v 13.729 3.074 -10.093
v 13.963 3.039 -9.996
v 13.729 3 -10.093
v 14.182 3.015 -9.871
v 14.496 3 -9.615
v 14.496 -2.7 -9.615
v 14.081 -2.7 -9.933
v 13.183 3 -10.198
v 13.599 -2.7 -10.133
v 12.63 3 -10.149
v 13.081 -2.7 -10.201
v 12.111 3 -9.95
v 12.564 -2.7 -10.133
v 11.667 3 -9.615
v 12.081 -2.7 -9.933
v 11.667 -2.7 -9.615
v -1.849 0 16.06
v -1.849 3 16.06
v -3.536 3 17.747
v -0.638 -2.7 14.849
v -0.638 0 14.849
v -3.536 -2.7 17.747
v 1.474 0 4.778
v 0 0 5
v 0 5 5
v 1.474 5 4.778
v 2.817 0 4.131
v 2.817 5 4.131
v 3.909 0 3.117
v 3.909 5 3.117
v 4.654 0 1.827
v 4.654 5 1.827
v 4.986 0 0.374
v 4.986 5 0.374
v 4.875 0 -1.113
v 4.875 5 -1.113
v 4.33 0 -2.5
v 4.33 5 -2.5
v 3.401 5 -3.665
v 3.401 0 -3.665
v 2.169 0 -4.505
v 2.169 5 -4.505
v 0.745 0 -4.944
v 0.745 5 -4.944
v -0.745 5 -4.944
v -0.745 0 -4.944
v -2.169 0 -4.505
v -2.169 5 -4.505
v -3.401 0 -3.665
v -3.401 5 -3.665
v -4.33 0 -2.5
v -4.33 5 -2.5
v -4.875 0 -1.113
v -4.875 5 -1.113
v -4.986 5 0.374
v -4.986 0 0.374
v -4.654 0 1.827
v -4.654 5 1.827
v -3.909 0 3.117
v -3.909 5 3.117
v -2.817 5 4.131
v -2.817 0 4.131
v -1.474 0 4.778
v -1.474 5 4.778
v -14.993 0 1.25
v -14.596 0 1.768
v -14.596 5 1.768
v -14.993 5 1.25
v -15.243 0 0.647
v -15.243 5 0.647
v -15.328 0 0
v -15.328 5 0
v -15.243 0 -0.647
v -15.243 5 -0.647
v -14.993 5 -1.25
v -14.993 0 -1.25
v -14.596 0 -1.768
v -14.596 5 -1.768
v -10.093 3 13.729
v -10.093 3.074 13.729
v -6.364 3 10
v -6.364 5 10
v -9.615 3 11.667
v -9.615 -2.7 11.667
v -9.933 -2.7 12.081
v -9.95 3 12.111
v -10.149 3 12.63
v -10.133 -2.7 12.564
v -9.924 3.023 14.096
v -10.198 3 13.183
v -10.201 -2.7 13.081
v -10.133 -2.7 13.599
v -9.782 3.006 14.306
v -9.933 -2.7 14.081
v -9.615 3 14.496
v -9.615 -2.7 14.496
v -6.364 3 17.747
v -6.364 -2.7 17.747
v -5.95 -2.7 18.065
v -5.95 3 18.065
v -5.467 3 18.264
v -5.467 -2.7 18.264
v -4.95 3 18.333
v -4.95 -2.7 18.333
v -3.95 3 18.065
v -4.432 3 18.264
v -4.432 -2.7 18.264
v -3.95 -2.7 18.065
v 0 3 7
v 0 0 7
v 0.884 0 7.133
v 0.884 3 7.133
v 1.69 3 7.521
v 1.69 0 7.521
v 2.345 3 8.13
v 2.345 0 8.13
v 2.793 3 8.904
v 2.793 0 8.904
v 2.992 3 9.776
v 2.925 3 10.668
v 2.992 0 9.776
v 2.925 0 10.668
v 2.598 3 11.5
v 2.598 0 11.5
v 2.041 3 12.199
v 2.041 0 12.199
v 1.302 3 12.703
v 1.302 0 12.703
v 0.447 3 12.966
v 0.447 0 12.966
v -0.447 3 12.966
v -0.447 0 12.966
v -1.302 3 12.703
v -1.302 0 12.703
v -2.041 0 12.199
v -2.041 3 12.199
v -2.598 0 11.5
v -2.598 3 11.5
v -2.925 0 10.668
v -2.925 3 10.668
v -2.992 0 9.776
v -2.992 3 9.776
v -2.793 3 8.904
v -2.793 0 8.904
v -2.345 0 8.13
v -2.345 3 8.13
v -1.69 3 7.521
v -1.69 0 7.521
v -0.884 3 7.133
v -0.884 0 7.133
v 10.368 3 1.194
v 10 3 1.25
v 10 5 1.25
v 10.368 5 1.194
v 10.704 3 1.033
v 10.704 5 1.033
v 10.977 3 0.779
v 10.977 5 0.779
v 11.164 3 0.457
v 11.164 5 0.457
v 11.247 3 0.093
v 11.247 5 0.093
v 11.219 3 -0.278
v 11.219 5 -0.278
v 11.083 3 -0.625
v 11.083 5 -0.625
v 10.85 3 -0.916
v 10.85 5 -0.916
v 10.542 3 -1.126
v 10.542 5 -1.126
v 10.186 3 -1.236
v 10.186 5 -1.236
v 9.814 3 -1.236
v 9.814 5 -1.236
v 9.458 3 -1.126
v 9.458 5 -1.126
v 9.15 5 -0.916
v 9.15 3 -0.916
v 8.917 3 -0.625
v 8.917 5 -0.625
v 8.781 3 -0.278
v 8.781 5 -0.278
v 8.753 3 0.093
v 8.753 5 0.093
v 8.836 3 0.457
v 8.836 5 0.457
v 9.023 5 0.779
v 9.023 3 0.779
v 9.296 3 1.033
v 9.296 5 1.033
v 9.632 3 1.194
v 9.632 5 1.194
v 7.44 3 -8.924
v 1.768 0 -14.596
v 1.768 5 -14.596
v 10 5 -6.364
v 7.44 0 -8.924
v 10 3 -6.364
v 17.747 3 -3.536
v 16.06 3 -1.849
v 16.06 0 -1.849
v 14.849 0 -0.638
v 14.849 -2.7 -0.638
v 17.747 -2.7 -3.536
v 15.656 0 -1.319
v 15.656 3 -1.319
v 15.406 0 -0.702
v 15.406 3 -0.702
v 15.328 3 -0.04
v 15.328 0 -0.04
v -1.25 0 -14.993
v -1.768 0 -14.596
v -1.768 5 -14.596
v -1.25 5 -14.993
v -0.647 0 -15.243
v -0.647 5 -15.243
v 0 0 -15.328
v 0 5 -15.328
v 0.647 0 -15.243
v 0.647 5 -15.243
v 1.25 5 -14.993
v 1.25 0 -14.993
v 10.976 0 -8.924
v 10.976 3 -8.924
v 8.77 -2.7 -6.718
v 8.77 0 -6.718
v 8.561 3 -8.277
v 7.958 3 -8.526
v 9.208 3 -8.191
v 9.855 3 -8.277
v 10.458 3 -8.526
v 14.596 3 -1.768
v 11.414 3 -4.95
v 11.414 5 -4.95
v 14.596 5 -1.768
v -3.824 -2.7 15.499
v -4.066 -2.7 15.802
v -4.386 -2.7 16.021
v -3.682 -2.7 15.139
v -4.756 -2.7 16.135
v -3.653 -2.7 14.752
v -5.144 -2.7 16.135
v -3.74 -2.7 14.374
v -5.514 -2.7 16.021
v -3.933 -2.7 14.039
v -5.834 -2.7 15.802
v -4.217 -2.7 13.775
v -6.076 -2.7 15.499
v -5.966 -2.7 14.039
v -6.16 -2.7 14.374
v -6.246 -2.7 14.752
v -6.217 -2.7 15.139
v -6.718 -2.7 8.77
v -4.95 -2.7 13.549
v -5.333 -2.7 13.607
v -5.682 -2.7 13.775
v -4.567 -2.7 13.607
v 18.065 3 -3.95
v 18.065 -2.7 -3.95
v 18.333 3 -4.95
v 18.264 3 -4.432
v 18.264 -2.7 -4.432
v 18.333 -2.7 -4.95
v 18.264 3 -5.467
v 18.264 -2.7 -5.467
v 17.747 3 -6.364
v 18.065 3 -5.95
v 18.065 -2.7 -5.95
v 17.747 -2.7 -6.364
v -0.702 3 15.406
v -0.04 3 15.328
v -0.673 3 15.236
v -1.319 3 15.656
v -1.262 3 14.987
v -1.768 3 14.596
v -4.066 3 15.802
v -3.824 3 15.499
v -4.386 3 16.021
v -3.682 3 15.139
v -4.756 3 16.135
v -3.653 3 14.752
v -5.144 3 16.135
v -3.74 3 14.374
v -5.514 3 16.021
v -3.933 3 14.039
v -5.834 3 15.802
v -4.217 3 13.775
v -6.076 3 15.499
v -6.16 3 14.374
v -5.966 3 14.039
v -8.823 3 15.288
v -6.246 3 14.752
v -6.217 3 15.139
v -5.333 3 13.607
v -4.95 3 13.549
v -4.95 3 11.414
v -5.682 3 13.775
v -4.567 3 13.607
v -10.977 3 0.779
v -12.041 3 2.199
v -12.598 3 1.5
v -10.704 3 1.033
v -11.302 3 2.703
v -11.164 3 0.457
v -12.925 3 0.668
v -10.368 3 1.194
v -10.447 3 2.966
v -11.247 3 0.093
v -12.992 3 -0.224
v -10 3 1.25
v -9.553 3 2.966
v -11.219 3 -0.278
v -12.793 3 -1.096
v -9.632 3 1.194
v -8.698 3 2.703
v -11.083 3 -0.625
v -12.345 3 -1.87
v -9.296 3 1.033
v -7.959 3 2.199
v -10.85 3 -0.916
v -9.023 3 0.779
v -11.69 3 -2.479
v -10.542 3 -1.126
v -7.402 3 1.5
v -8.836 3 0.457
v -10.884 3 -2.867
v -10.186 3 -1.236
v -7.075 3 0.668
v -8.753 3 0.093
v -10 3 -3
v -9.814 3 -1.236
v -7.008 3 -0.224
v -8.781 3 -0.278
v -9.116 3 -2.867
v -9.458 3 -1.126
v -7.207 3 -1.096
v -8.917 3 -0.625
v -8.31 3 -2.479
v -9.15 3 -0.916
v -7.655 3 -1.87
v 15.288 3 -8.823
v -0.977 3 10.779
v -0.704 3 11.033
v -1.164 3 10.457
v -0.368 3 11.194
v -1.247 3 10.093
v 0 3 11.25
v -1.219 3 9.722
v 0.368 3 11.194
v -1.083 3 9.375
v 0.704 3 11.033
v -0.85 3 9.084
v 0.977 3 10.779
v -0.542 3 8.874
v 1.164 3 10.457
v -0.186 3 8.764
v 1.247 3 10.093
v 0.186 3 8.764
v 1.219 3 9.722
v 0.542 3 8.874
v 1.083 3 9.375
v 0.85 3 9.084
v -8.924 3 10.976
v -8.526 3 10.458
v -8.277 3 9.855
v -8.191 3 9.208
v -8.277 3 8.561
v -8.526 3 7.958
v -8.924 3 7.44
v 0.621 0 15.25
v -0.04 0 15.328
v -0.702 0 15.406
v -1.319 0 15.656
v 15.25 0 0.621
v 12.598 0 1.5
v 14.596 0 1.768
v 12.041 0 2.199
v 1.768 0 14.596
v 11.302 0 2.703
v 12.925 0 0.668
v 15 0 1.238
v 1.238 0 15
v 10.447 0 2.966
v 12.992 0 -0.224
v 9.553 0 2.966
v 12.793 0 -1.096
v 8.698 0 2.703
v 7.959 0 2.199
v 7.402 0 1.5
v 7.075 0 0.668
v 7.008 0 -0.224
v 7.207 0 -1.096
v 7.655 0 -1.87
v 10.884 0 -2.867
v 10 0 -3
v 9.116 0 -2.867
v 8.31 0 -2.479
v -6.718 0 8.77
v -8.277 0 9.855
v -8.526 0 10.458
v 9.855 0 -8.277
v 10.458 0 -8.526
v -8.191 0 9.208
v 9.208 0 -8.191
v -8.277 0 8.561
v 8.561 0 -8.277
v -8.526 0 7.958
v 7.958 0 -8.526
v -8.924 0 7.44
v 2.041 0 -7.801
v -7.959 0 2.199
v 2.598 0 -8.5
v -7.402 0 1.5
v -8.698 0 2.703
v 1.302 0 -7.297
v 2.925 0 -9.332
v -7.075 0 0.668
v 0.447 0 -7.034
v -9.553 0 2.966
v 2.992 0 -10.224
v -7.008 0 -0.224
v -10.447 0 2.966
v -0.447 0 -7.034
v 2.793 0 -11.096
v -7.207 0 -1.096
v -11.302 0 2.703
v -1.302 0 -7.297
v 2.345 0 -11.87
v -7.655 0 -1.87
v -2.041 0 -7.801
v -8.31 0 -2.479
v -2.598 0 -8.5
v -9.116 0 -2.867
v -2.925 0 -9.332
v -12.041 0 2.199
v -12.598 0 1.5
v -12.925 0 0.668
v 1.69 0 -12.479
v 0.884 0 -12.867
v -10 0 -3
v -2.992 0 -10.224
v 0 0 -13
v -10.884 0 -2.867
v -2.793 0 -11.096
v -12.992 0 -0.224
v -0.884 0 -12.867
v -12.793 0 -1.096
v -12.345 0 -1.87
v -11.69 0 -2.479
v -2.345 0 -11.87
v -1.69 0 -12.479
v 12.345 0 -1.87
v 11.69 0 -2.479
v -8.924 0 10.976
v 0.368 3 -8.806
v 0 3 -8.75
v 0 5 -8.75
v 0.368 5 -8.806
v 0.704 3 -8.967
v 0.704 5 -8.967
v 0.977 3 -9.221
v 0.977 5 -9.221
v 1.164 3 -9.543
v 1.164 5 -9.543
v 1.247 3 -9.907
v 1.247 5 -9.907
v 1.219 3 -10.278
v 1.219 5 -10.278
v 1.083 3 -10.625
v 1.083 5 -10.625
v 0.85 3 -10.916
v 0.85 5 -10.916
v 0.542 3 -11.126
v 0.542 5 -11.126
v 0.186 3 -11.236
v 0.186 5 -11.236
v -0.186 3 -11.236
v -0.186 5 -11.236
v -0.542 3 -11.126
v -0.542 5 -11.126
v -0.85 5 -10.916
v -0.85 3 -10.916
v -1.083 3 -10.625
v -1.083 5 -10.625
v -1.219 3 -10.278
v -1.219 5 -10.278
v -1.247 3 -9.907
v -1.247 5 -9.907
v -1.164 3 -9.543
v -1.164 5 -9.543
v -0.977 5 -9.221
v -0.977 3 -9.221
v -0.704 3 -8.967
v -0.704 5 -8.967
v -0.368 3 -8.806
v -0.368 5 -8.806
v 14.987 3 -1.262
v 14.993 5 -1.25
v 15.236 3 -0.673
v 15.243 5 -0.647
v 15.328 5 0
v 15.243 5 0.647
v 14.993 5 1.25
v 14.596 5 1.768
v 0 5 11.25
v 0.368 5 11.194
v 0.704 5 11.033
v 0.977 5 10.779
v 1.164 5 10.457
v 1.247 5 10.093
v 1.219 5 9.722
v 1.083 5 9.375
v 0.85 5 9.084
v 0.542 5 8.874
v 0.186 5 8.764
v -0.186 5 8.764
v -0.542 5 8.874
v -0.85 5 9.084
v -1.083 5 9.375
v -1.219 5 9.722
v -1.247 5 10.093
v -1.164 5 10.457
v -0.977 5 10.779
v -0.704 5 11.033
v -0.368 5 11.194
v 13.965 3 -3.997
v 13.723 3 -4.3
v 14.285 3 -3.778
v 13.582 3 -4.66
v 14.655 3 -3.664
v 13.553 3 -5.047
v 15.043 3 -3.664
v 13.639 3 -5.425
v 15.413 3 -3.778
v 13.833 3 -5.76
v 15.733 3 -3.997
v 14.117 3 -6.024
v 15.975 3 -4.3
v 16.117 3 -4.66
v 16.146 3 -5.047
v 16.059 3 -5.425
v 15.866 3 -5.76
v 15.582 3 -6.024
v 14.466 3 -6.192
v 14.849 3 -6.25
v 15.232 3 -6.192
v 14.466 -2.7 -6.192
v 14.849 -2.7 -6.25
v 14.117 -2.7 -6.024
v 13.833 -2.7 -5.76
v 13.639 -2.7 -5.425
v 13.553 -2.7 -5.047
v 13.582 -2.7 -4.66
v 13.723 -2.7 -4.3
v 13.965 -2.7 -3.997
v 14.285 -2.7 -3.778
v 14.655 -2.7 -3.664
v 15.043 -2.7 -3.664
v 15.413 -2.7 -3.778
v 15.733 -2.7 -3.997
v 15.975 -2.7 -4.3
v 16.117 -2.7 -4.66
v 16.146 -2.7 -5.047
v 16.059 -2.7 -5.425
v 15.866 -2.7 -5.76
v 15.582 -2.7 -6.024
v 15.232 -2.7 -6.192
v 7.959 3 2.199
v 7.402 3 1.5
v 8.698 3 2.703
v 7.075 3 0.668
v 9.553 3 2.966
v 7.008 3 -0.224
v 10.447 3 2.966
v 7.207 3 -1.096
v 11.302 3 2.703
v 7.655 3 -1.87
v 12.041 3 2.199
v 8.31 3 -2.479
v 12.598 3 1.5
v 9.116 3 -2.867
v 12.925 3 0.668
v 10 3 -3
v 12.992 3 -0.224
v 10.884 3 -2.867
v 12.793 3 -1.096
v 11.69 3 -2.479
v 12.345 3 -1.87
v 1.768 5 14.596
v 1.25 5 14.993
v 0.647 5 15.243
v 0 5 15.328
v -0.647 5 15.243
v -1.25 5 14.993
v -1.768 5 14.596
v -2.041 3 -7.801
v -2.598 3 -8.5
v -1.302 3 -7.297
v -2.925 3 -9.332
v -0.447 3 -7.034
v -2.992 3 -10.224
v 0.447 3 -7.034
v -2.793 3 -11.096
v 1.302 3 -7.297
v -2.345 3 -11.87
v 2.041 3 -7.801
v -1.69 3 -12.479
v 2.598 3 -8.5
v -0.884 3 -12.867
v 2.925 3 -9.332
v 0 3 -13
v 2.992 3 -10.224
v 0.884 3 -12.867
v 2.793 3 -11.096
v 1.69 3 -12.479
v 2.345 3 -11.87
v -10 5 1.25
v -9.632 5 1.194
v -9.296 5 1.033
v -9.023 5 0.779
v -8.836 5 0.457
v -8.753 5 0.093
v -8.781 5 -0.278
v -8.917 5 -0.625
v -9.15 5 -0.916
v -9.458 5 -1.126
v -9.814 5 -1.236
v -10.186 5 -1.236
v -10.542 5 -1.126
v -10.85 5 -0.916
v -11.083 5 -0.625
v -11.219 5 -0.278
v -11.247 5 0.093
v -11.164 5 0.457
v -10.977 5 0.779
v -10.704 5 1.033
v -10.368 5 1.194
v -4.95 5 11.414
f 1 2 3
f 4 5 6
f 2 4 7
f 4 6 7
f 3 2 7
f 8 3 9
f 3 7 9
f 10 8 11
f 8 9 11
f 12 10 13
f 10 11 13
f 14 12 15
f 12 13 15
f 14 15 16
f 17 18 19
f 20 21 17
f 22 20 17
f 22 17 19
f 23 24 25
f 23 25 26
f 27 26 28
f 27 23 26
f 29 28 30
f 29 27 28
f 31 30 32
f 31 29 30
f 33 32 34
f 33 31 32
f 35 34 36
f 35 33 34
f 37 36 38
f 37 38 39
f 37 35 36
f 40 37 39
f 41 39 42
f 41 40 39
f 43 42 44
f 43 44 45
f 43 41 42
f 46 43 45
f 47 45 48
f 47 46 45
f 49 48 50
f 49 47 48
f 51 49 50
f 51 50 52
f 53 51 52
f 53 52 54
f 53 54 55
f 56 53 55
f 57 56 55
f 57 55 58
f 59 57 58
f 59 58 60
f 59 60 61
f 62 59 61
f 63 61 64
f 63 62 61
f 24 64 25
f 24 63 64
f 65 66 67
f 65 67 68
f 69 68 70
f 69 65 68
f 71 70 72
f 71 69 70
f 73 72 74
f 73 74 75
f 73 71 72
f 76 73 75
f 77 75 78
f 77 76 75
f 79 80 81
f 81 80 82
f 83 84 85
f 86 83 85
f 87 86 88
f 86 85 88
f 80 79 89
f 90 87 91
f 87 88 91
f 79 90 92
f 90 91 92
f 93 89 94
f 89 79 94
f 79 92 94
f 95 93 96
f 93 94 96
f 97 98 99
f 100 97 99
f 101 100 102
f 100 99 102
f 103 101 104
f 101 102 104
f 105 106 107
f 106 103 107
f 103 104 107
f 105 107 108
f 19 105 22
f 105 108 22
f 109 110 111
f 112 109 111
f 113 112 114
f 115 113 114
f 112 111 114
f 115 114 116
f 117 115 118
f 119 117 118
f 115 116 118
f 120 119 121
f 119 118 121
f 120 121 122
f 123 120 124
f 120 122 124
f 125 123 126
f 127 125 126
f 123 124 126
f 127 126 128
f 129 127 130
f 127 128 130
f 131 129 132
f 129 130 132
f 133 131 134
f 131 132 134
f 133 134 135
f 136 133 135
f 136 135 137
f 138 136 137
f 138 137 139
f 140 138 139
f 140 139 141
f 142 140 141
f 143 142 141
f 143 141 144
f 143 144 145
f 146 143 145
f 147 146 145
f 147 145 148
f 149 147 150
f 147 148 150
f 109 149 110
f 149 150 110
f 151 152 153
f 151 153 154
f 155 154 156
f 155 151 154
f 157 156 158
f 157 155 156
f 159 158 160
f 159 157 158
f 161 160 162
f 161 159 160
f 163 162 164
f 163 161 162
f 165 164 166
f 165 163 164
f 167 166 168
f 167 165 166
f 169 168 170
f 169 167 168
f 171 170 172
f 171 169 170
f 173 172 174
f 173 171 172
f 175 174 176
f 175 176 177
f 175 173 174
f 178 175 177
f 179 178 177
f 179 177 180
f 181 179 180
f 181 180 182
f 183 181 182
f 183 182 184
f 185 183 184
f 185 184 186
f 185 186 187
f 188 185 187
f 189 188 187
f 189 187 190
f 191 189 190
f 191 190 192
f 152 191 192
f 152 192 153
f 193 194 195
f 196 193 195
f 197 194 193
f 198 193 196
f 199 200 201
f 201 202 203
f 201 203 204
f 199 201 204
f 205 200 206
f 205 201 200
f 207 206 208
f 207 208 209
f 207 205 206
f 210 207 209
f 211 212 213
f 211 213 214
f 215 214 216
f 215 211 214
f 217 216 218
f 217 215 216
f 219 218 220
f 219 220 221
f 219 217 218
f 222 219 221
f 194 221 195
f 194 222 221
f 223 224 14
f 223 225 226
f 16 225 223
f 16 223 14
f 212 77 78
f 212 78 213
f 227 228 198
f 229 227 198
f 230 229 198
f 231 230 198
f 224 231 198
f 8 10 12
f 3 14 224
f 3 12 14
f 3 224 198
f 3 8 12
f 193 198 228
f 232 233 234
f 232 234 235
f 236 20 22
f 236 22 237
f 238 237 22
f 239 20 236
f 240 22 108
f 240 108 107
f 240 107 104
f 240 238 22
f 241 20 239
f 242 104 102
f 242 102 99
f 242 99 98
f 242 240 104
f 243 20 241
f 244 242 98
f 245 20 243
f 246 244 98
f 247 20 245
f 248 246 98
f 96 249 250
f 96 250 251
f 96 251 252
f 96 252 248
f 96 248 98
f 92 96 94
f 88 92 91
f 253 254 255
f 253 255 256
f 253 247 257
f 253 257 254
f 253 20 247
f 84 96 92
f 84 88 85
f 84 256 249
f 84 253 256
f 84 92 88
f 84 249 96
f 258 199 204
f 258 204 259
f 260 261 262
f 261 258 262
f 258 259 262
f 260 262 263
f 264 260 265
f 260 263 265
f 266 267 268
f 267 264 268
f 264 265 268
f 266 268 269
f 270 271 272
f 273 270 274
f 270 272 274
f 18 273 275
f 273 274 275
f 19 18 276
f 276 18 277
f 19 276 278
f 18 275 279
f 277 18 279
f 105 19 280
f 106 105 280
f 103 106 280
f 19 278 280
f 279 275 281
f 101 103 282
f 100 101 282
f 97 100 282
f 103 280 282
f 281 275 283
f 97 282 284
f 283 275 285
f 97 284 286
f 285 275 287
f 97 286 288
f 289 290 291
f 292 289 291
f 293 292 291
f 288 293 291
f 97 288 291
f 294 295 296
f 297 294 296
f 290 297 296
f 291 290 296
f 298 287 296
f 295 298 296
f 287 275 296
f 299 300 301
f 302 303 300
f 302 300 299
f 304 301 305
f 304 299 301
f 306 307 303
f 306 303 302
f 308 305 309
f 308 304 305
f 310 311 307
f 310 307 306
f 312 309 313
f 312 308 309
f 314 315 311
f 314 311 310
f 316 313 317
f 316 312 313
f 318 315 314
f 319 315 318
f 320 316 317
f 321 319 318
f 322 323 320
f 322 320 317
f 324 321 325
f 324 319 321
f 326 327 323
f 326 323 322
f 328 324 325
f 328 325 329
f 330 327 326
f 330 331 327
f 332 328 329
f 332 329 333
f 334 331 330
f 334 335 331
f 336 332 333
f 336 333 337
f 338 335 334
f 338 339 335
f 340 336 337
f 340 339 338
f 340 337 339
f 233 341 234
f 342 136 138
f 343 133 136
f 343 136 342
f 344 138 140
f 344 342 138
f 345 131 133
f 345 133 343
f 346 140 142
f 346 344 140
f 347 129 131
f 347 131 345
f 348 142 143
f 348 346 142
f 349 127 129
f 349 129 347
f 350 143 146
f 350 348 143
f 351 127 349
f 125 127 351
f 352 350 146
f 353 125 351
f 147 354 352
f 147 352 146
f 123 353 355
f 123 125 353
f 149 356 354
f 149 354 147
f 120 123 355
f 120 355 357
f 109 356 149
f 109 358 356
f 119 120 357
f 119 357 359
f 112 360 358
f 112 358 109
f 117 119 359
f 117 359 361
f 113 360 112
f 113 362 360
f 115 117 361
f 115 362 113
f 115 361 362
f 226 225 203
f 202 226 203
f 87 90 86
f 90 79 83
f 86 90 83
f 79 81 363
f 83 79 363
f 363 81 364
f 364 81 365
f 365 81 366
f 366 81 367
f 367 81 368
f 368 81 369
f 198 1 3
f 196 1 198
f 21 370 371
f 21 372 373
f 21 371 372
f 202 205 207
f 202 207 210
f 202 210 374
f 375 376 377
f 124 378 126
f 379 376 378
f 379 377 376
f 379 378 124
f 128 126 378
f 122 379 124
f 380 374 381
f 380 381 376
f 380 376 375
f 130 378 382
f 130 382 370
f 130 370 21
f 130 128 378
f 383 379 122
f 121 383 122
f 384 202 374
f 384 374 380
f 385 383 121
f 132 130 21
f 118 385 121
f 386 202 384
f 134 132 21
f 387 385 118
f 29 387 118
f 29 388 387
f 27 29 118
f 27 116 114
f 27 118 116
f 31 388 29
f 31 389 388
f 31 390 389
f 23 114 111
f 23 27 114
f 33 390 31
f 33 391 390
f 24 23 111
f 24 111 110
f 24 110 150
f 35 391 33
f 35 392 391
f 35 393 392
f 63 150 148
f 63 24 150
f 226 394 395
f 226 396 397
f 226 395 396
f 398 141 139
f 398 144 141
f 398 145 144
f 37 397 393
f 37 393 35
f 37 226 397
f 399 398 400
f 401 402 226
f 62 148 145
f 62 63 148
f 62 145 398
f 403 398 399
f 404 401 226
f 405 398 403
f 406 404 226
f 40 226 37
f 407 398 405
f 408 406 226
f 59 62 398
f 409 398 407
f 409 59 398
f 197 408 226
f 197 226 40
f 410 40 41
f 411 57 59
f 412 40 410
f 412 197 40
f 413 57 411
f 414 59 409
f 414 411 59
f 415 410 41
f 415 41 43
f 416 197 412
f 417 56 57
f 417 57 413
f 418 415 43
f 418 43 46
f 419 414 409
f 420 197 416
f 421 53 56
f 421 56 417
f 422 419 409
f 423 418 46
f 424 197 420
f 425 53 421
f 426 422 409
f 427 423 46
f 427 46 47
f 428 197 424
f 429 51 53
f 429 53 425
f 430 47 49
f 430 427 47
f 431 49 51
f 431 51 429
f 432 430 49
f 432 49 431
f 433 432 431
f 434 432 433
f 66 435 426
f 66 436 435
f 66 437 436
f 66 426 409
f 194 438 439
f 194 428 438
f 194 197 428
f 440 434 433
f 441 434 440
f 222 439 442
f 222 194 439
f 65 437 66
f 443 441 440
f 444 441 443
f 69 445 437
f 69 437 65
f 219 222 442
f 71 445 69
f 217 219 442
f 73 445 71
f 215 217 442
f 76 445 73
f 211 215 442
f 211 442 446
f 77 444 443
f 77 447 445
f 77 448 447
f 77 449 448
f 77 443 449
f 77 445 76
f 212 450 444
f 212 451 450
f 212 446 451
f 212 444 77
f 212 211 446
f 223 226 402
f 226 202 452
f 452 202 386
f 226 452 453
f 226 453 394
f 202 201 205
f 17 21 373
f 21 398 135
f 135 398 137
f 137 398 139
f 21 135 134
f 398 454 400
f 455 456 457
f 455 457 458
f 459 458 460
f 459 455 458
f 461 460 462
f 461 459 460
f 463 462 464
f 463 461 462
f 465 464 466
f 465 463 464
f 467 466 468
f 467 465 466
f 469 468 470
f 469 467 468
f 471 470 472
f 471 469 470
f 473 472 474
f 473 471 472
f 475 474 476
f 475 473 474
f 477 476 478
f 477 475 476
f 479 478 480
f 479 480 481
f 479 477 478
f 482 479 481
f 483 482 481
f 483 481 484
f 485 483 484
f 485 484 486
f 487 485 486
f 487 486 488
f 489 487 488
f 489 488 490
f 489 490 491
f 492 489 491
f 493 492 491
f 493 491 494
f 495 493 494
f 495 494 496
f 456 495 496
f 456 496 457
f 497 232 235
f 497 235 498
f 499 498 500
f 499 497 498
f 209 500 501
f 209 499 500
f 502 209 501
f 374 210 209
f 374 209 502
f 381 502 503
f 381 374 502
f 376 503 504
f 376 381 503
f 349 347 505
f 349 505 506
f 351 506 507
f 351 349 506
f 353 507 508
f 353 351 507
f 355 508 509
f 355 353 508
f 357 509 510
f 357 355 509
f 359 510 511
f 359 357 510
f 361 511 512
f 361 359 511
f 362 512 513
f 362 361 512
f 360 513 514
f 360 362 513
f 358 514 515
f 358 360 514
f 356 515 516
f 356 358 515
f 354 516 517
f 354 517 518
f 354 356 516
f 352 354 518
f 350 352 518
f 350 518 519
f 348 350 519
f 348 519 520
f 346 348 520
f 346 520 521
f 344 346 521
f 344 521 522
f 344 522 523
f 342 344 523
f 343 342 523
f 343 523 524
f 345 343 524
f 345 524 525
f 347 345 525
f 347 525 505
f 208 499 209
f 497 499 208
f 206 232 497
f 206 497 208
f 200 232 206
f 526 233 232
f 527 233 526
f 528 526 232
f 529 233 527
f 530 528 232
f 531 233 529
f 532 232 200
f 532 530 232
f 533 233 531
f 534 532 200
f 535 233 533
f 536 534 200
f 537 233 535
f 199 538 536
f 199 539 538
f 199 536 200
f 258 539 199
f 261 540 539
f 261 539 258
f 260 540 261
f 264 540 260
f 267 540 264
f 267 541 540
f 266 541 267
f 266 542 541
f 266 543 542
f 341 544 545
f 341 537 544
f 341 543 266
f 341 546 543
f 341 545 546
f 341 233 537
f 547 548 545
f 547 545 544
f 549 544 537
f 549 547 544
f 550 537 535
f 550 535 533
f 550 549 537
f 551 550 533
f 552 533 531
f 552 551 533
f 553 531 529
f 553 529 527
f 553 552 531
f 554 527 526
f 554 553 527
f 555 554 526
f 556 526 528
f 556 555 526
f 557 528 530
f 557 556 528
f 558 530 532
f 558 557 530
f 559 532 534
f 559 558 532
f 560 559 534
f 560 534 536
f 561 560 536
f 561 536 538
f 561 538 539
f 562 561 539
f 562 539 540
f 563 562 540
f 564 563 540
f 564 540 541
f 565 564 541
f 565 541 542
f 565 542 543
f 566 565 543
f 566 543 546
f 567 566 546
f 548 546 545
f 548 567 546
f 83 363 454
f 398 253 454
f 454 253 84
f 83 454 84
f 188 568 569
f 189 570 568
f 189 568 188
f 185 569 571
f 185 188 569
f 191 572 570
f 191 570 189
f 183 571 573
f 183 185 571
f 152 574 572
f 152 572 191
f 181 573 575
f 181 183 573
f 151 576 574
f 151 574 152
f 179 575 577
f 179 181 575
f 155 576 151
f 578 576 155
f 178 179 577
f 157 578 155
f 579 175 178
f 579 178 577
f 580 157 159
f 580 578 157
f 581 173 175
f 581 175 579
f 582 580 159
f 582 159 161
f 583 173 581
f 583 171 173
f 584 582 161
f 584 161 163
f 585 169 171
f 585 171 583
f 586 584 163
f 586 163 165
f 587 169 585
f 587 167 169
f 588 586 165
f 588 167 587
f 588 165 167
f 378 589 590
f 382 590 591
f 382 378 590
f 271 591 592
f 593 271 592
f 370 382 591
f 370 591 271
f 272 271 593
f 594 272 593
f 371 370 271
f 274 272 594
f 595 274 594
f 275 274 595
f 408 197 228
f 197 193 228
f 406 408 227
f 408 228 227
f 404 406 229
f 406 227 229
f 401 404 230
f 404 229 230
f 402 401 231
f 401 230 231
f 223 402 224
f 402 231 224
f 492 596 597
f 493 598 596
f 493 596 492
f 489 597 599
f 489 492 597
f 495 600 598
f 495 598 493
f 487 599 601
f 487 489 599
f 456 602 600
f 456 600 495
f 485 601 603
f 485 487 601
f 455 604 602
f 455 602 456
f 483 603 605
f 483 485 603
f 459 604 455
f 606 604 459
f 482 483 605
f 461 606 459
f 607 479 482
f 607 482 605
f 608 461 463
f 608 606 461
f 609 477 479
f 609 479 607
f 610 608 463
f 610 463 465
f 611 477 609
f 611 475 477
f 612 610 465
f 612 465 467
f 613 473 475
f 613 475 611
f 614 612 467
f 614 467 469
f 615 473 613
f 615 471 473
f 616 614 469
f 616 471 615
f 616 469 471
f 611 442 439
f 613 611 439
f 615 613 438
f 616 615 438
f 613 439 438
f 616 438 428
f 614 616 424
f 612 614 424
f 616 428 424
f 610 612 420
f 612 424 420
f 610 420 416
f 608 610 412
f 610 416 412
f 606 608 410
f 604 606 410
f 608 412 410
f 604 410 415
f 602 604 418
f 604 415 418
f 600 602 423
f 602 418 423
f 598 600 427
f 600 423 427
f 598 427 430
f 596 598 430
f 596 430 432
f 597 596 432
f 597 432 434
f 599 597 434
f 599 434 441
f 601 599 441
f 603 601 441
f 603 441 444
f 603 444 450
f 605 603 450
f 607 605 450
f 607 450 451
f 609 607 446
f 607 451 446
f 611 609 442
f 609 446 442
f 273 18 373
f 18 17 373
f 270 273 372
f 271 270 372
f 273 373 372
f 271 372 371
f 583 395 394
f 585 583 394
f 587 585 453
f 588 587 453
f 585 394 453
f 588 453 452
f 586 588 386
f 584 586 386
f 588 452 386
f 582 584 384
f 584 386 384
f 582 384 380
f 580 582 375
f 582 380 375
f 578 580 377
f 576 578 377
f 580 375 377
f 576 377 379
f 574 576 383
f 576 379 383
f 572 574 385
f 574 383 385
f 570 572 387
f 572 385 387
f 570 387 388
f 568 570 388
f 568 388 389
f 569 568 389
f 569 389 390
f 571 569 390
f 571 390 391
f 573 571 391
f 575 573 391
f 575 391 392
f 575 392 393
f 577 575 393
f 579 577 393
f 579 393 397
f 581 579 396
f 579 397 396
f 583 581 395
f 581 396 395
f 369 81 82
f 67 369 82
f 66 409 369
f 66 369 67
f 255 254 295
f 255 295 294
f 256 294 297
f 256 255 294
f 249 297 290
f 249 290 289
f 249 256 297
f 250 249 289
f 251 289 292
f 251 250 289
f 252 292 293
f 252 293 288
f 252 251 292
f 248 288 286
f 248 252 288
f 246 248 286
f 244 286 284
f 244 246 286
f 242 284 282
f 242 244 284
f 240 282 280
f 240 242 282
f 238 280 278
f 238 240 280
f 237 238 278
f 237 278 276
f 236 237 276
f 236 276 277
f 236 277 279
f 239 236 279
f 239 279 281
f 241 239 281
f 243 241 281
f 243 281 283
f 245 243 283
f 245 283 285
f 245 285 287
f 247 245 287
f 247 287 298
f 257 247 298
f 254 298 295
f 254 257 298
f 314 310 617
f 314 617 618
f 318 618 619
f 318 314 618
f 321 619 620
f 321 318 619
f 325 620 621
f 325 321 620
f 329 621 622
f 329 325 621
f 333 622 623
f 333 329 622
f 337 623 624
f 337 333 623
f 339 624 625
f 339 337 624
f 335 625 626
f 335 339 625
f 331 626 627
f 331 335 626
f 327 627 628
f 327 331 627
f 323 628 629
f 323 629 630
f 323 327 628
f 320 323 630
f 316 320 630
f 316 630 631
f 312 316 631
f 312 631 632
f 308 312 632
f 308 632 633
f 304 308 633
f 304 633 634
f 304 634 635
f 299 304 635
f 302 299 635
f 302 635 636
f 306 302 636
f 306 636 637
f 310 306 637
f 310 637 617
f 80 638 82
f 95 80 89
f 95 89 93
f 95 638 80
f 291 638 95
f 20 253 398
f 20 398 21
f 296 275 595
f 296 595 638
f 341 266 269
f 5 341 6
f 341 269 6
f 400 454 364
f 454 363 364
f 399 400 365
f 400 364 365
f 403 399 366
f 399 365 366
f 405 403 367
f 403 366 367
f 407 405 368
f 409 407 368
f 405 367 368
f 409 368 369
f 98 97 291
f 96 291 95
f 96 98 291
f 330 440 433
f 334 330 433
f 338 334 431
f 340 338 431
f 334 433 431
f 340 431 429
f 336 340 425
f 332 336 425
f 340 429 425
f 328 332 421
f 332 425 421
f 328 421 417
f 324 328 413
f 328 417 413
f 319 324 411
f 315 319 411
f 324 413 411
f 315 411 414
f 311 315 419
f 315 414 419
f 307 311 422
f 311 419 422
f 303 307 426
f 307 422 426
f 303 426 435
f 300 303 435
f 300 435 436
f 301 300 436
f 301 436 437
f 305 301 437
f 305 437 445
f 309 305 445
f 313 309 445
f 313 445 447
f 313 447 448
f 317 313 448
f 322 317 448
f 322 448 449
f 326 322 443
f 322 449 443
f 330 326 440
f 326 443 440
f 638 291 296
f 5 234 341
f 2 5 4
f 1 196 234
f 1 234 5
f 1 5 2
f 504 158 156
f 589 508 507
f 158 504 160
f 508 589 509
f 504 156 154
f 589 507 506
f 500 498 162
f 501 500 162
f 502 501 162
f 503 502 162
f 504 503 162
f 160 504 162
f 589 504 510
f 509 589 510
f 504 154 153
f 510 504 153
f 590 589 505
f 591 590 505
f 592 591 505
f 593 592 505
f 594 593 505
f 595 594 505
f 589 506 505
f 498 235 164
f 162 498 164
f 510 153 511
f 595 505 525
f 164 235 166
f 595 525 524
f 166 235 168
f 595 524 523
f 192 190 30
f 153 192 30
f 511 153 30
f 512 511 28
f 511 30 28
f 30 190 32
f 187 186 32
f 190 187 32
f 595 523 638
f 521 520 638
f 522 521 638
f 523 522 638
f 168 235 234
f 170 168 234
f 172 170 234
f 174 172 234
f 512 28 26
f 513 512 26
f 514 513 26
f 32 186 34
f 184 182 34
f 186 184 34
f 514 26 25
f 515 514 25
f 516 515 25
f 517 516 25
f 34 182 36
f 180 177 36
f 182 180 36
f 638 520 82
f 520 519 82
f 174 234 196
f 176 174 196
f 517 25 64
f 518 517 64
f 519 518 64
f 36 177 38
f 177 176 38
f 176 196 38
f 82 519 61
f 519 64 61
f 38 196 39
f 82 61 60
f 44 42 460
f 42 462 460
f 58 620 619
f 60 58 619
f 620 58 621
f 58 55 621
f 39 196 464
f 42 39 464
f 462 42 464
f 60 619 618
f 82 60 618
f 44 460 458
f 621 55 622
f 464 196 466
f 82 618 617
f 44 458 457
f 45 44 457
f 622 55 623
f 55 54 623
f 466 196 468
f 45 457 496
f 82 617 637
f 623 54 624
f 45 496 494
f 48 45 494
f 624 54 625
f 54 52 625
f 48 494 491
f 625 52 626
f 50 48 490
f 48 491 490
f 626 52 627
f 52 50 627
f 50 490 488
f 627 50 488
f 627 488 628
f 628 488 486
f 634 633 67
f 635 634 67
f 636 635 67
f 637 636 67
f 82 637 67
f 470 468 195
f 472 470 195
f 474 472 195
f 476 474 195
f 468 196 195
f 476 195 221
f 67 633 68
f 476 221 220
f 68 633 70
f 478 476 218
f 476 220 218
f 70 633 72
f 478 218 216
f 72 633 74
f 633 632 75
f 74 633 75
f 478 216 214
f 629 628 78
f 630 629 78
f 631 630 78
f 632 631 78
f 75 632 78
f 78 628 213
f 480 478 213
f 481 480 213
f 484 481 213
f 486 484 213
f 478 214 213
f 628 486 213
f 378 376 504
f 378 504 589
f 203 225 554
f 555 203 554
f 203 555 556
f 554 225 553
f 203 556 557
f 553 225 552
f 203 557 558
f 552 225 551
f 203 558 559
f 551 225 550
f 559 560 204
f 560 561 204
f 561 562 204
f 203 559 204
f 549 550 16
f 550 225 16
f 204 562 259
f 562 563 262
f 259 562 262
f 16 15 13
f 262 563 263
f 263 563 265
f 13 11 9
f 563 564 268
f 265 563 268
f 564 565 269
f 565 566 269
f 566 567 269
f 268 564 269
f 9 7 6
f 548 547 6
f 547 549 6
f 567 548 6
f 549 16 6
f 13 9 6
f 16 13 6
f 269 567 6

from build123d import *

# Parameters (mm, degrees)
SKETCH1_R           = 1.25
SKETCH1_R_2         = 5
BOSS_EXTRUDE1_DEPTH = 5
SKETCH4_R           = 3
CUT_EXTRUDE2_DEPTH  = 3
SKETCH3_R           = 1.3
BOSS_EXTRUDE4_DEPTH = 5.7
BOSS_EXTRUDE6_DEPTH = 1
FILLET1_R           = 2.5
FILLET2_R           = 2


with BuildPart() as part:
    # Sketch1 → Boss-Extrude1 (new body)
    with BuildSketch(Plane(origin=(0, 0, 0), x_dir=(1, 0, 0), z_dir=(0, 1, 0))):
        with BuildLine():
            Line((1.767766953, 14.596194078), (14.596194078, 1.767766953))
            ThreePointArc((14.596194078, 1.767766953), (15.328427125, 0), (14.596194078, -1.767766953))
            Line((14.596194078, -1.767766953), (1.767766953, -14.596194078))
            ThreePointArc((1.767766953, -14.596194078), (0, -15.328427125), (-1.767766953, -14.596194078))
            Line((-1.767766953, -14.596194078), (-14.596194078, -1.767766953))
            ThreePointArc((-14.596194078, -1.767766953), (-15.328427125, 0), (-14.596194078, 1.767766953))
            Line((-14.596194078, 1.767766953), (-1.767766953, 14.596194078))
            ThreePointArc((-1.767766953, 14.596194078), (0, 15.328427125), (1.767766953, 14.596194078))
        make_face()
        with Locations(Location((0, 10, 0), (0, 0, 270))):
            Circle(SKETCH1_R, mode=Mode.SUBTRACT)
        with Locations(Location((0, -10, 0), (0, 0, 270))):
            Circle(SKETCH1_R, mode=Mode.SUBTRACT)
        with Locations(Location((10, 0, 0), (0, 0, 270))):
            Circle(SKETCH1_R, mode=Mode.SUBTRACT)
        with Locations(Location((-10, 0, 0), (0, 0, 270))):
            Circle(SKETCH1_R, mode=Mode.SUBTRACT)
        with Locations(Location((0, 0, 0), (0, 0, 270))):
            Circle(SKETCH1_R_2, mode=Mode.SUBTRACT)
    extrude(amount=BOSS_EXTRUDE1_DEPTH)

    # Sketch4 → Cut-Extrude2 (cut)
    with BuildSketch(Plane.XZ):
        with Locations(Location((0, 10, 0), (0, 0, 270))):
            Circle(SKETCH4_R)
        with Locations(Location((10, 0, 0), (0, 0, 270))):
            Circle(SKETCH4_R)
        with Locations(Location((-10, 0, 0), (0, 0, 270))):
            Circle(SKETCH4_R)
        with Locations(Location((0, -10, 0), (0, 0, 270))):
            Circle(SKETCH4_R)
    extrude(amount=-CUT_EXTRUDE2_DEPTH, mode=Mode.SUBTRACT)

    # Sketch3 → Boss-Extrude4 (add)
    # profile 1 of 4: a face of its own
    with BuildSketch(Plane(origin=(0, -2.7, 0), x_dir=(1, 0, 0), z_dir=(0, 1, 0))):
        Polygon((-4.949747468, -10.537489101), (-0.637994164, -14.849242405), (-4.949747468, -19.160995709), (-9.261500772, -14.849242405), align=None)
        with Locations(Location((-4.949747468, -14.849242405, 0), (0, 0, 90))):
            Circle(SKETCH3_R, mode=Mode.SUBTRACT)
    # profile 2 of 4: a face of its own
    with BuildSketch(Plane(origin=(0, -2.7, 0), x_dir=(1, 0, 0), z_dir=(0, 1, 0))):
        Polygon((-6.717514421, -8.769722148), (-11.029267725, -13.081475452), (-9.261500772, -14.849242405), (-4.949747468, -10.537489101), align=None)
    # profile 3 of 4: a face of its own
    with BuildSketch(Plane(origin=(0, -2.7, 0), x_dir=(1, 0, 0), z_dir=(0, 1, 0))):
        Polygon((19.160995709, 4.949747468), (14.849242405, 9.261500772), (10.537489101, 4.949747468), (14.849242405, 0.637994164), align=None)
        with Locations(Location((14.849242405, 4.949747468, 0), (0, 0, 90))):
            Circle(SKETCH3_R, mode=Mode.SUBTRACT)
    # profile 4 of 4: a face of its own
    with BuildSketch(Plane(origin=(0, -2.7, 0), x_dir=(1, 0, 0), z_dir=(0, 1, 0))):
        Polygon((13.081475452, 11.029267725), (14.849242405, 9.261500772), (10.537489101, 4.949747468), (8.769722148, 6.717514421), align=None)
    extrude(amount=BOSS_EXTRUDE4_DEPTH)


with BuildPart() as boss_extrude6_tool:
    # Sketch7 → Boss-Extrude6 (new, symmetric)
    with BuildSketch(Plane(origin=(2.525126055, -2.13e-07, 2.525126055), x_dir=(0.7071067811865474, 0, -0.7071067811865477), z_dir=(0.7071067811865465, -5.960464483662305e-08, 0.7071067811865461))):
        Polygon((11.571067812, 5.000000541), (17.04887, 3.000000599), (11.571067812, 3.000000541), align=None)
        Polygon((-11.571067812, 5.000000541), (-17.04887, 3.000000599), (-11.571067812, 3.000000541), align=None)
    extrude(amount=BOSS_EXTRUDE6_DEPTH, both=True)


with BuildPart() as part_1:
    add(part.part)


with BuildPart() as part_2:
    # Boss-Extrude6: joined with boss_extrude6_tool
    add(part_1.part.fuse(boss_extrude6_tool.part, tol=0.00001))

    # Fillet1
    fillet1_edges = [part_2.edges().sort_by_distance(p)[0] for p in [
        (-7.155876652, 1.5, 9.208084379),
        (-0.935534875, 1.5, 15.146783115),
        (9.208084379, 1.5, -7.155876652),
        (15.146783115, 1.5, -0.935534875),
    ]]
    fillet(fillet1_edges, radius=FILLET1_R)

    # Fillet2
    # the kernel refuses this fillet: 2 mm, written as the material it takes off along each edge
    with BuildSketch(Plane(origin=(-4.949747468, -7.7, 19.160995709), x_dir=(-0.7071067811865471, 0, -0.707106781186548), z_dir=(0, 1, 0)), Plane(origin=(13.081475452, -7.7, -11.029267725), x_dir=(0.7071067811865476, 0, 0.7071067811865476), z_dir=(0, 1, 0))) as fillet2_piece_1:
        with BuildLine():
            CenterArc((FILLET2_R, -FILLET2_R), FILLET2_R, 90, 90)
            Line((0, -FILLET2_R), (0, 0))
            Line((0, 0), (FILLET2_R, 0))
        make_face()
    extrude(amount=15.7, mode=Mode.SUBTRACT)
    with BuildSketch(Plane(origin=(-11.029267725, -7.7, 13.081475452), x_dir=(0.707106781186547, 0, 0.7071067811865479), z_dir=(0, 1, 0)), Plane(origin=(19.160995709, -7.7, -4.949747468), x_dir=(-0.7071067811865482, 0, -0.7071067811865469), z_dir=(0, 1, 0))) as fillet2_piece_2:
        with BuildLine():
            CenterArc((FILLET2_R, FILLET2_R), FILLET2_R, 180, 90)
            Line((0, FILLET2_R), (0, 0))
            Line((0, 0), (FILLET2_R, 0))
        make_face()
    extrude(amount=15.7, mode=Mode.SUBTRACT)


solid = part_2.part
